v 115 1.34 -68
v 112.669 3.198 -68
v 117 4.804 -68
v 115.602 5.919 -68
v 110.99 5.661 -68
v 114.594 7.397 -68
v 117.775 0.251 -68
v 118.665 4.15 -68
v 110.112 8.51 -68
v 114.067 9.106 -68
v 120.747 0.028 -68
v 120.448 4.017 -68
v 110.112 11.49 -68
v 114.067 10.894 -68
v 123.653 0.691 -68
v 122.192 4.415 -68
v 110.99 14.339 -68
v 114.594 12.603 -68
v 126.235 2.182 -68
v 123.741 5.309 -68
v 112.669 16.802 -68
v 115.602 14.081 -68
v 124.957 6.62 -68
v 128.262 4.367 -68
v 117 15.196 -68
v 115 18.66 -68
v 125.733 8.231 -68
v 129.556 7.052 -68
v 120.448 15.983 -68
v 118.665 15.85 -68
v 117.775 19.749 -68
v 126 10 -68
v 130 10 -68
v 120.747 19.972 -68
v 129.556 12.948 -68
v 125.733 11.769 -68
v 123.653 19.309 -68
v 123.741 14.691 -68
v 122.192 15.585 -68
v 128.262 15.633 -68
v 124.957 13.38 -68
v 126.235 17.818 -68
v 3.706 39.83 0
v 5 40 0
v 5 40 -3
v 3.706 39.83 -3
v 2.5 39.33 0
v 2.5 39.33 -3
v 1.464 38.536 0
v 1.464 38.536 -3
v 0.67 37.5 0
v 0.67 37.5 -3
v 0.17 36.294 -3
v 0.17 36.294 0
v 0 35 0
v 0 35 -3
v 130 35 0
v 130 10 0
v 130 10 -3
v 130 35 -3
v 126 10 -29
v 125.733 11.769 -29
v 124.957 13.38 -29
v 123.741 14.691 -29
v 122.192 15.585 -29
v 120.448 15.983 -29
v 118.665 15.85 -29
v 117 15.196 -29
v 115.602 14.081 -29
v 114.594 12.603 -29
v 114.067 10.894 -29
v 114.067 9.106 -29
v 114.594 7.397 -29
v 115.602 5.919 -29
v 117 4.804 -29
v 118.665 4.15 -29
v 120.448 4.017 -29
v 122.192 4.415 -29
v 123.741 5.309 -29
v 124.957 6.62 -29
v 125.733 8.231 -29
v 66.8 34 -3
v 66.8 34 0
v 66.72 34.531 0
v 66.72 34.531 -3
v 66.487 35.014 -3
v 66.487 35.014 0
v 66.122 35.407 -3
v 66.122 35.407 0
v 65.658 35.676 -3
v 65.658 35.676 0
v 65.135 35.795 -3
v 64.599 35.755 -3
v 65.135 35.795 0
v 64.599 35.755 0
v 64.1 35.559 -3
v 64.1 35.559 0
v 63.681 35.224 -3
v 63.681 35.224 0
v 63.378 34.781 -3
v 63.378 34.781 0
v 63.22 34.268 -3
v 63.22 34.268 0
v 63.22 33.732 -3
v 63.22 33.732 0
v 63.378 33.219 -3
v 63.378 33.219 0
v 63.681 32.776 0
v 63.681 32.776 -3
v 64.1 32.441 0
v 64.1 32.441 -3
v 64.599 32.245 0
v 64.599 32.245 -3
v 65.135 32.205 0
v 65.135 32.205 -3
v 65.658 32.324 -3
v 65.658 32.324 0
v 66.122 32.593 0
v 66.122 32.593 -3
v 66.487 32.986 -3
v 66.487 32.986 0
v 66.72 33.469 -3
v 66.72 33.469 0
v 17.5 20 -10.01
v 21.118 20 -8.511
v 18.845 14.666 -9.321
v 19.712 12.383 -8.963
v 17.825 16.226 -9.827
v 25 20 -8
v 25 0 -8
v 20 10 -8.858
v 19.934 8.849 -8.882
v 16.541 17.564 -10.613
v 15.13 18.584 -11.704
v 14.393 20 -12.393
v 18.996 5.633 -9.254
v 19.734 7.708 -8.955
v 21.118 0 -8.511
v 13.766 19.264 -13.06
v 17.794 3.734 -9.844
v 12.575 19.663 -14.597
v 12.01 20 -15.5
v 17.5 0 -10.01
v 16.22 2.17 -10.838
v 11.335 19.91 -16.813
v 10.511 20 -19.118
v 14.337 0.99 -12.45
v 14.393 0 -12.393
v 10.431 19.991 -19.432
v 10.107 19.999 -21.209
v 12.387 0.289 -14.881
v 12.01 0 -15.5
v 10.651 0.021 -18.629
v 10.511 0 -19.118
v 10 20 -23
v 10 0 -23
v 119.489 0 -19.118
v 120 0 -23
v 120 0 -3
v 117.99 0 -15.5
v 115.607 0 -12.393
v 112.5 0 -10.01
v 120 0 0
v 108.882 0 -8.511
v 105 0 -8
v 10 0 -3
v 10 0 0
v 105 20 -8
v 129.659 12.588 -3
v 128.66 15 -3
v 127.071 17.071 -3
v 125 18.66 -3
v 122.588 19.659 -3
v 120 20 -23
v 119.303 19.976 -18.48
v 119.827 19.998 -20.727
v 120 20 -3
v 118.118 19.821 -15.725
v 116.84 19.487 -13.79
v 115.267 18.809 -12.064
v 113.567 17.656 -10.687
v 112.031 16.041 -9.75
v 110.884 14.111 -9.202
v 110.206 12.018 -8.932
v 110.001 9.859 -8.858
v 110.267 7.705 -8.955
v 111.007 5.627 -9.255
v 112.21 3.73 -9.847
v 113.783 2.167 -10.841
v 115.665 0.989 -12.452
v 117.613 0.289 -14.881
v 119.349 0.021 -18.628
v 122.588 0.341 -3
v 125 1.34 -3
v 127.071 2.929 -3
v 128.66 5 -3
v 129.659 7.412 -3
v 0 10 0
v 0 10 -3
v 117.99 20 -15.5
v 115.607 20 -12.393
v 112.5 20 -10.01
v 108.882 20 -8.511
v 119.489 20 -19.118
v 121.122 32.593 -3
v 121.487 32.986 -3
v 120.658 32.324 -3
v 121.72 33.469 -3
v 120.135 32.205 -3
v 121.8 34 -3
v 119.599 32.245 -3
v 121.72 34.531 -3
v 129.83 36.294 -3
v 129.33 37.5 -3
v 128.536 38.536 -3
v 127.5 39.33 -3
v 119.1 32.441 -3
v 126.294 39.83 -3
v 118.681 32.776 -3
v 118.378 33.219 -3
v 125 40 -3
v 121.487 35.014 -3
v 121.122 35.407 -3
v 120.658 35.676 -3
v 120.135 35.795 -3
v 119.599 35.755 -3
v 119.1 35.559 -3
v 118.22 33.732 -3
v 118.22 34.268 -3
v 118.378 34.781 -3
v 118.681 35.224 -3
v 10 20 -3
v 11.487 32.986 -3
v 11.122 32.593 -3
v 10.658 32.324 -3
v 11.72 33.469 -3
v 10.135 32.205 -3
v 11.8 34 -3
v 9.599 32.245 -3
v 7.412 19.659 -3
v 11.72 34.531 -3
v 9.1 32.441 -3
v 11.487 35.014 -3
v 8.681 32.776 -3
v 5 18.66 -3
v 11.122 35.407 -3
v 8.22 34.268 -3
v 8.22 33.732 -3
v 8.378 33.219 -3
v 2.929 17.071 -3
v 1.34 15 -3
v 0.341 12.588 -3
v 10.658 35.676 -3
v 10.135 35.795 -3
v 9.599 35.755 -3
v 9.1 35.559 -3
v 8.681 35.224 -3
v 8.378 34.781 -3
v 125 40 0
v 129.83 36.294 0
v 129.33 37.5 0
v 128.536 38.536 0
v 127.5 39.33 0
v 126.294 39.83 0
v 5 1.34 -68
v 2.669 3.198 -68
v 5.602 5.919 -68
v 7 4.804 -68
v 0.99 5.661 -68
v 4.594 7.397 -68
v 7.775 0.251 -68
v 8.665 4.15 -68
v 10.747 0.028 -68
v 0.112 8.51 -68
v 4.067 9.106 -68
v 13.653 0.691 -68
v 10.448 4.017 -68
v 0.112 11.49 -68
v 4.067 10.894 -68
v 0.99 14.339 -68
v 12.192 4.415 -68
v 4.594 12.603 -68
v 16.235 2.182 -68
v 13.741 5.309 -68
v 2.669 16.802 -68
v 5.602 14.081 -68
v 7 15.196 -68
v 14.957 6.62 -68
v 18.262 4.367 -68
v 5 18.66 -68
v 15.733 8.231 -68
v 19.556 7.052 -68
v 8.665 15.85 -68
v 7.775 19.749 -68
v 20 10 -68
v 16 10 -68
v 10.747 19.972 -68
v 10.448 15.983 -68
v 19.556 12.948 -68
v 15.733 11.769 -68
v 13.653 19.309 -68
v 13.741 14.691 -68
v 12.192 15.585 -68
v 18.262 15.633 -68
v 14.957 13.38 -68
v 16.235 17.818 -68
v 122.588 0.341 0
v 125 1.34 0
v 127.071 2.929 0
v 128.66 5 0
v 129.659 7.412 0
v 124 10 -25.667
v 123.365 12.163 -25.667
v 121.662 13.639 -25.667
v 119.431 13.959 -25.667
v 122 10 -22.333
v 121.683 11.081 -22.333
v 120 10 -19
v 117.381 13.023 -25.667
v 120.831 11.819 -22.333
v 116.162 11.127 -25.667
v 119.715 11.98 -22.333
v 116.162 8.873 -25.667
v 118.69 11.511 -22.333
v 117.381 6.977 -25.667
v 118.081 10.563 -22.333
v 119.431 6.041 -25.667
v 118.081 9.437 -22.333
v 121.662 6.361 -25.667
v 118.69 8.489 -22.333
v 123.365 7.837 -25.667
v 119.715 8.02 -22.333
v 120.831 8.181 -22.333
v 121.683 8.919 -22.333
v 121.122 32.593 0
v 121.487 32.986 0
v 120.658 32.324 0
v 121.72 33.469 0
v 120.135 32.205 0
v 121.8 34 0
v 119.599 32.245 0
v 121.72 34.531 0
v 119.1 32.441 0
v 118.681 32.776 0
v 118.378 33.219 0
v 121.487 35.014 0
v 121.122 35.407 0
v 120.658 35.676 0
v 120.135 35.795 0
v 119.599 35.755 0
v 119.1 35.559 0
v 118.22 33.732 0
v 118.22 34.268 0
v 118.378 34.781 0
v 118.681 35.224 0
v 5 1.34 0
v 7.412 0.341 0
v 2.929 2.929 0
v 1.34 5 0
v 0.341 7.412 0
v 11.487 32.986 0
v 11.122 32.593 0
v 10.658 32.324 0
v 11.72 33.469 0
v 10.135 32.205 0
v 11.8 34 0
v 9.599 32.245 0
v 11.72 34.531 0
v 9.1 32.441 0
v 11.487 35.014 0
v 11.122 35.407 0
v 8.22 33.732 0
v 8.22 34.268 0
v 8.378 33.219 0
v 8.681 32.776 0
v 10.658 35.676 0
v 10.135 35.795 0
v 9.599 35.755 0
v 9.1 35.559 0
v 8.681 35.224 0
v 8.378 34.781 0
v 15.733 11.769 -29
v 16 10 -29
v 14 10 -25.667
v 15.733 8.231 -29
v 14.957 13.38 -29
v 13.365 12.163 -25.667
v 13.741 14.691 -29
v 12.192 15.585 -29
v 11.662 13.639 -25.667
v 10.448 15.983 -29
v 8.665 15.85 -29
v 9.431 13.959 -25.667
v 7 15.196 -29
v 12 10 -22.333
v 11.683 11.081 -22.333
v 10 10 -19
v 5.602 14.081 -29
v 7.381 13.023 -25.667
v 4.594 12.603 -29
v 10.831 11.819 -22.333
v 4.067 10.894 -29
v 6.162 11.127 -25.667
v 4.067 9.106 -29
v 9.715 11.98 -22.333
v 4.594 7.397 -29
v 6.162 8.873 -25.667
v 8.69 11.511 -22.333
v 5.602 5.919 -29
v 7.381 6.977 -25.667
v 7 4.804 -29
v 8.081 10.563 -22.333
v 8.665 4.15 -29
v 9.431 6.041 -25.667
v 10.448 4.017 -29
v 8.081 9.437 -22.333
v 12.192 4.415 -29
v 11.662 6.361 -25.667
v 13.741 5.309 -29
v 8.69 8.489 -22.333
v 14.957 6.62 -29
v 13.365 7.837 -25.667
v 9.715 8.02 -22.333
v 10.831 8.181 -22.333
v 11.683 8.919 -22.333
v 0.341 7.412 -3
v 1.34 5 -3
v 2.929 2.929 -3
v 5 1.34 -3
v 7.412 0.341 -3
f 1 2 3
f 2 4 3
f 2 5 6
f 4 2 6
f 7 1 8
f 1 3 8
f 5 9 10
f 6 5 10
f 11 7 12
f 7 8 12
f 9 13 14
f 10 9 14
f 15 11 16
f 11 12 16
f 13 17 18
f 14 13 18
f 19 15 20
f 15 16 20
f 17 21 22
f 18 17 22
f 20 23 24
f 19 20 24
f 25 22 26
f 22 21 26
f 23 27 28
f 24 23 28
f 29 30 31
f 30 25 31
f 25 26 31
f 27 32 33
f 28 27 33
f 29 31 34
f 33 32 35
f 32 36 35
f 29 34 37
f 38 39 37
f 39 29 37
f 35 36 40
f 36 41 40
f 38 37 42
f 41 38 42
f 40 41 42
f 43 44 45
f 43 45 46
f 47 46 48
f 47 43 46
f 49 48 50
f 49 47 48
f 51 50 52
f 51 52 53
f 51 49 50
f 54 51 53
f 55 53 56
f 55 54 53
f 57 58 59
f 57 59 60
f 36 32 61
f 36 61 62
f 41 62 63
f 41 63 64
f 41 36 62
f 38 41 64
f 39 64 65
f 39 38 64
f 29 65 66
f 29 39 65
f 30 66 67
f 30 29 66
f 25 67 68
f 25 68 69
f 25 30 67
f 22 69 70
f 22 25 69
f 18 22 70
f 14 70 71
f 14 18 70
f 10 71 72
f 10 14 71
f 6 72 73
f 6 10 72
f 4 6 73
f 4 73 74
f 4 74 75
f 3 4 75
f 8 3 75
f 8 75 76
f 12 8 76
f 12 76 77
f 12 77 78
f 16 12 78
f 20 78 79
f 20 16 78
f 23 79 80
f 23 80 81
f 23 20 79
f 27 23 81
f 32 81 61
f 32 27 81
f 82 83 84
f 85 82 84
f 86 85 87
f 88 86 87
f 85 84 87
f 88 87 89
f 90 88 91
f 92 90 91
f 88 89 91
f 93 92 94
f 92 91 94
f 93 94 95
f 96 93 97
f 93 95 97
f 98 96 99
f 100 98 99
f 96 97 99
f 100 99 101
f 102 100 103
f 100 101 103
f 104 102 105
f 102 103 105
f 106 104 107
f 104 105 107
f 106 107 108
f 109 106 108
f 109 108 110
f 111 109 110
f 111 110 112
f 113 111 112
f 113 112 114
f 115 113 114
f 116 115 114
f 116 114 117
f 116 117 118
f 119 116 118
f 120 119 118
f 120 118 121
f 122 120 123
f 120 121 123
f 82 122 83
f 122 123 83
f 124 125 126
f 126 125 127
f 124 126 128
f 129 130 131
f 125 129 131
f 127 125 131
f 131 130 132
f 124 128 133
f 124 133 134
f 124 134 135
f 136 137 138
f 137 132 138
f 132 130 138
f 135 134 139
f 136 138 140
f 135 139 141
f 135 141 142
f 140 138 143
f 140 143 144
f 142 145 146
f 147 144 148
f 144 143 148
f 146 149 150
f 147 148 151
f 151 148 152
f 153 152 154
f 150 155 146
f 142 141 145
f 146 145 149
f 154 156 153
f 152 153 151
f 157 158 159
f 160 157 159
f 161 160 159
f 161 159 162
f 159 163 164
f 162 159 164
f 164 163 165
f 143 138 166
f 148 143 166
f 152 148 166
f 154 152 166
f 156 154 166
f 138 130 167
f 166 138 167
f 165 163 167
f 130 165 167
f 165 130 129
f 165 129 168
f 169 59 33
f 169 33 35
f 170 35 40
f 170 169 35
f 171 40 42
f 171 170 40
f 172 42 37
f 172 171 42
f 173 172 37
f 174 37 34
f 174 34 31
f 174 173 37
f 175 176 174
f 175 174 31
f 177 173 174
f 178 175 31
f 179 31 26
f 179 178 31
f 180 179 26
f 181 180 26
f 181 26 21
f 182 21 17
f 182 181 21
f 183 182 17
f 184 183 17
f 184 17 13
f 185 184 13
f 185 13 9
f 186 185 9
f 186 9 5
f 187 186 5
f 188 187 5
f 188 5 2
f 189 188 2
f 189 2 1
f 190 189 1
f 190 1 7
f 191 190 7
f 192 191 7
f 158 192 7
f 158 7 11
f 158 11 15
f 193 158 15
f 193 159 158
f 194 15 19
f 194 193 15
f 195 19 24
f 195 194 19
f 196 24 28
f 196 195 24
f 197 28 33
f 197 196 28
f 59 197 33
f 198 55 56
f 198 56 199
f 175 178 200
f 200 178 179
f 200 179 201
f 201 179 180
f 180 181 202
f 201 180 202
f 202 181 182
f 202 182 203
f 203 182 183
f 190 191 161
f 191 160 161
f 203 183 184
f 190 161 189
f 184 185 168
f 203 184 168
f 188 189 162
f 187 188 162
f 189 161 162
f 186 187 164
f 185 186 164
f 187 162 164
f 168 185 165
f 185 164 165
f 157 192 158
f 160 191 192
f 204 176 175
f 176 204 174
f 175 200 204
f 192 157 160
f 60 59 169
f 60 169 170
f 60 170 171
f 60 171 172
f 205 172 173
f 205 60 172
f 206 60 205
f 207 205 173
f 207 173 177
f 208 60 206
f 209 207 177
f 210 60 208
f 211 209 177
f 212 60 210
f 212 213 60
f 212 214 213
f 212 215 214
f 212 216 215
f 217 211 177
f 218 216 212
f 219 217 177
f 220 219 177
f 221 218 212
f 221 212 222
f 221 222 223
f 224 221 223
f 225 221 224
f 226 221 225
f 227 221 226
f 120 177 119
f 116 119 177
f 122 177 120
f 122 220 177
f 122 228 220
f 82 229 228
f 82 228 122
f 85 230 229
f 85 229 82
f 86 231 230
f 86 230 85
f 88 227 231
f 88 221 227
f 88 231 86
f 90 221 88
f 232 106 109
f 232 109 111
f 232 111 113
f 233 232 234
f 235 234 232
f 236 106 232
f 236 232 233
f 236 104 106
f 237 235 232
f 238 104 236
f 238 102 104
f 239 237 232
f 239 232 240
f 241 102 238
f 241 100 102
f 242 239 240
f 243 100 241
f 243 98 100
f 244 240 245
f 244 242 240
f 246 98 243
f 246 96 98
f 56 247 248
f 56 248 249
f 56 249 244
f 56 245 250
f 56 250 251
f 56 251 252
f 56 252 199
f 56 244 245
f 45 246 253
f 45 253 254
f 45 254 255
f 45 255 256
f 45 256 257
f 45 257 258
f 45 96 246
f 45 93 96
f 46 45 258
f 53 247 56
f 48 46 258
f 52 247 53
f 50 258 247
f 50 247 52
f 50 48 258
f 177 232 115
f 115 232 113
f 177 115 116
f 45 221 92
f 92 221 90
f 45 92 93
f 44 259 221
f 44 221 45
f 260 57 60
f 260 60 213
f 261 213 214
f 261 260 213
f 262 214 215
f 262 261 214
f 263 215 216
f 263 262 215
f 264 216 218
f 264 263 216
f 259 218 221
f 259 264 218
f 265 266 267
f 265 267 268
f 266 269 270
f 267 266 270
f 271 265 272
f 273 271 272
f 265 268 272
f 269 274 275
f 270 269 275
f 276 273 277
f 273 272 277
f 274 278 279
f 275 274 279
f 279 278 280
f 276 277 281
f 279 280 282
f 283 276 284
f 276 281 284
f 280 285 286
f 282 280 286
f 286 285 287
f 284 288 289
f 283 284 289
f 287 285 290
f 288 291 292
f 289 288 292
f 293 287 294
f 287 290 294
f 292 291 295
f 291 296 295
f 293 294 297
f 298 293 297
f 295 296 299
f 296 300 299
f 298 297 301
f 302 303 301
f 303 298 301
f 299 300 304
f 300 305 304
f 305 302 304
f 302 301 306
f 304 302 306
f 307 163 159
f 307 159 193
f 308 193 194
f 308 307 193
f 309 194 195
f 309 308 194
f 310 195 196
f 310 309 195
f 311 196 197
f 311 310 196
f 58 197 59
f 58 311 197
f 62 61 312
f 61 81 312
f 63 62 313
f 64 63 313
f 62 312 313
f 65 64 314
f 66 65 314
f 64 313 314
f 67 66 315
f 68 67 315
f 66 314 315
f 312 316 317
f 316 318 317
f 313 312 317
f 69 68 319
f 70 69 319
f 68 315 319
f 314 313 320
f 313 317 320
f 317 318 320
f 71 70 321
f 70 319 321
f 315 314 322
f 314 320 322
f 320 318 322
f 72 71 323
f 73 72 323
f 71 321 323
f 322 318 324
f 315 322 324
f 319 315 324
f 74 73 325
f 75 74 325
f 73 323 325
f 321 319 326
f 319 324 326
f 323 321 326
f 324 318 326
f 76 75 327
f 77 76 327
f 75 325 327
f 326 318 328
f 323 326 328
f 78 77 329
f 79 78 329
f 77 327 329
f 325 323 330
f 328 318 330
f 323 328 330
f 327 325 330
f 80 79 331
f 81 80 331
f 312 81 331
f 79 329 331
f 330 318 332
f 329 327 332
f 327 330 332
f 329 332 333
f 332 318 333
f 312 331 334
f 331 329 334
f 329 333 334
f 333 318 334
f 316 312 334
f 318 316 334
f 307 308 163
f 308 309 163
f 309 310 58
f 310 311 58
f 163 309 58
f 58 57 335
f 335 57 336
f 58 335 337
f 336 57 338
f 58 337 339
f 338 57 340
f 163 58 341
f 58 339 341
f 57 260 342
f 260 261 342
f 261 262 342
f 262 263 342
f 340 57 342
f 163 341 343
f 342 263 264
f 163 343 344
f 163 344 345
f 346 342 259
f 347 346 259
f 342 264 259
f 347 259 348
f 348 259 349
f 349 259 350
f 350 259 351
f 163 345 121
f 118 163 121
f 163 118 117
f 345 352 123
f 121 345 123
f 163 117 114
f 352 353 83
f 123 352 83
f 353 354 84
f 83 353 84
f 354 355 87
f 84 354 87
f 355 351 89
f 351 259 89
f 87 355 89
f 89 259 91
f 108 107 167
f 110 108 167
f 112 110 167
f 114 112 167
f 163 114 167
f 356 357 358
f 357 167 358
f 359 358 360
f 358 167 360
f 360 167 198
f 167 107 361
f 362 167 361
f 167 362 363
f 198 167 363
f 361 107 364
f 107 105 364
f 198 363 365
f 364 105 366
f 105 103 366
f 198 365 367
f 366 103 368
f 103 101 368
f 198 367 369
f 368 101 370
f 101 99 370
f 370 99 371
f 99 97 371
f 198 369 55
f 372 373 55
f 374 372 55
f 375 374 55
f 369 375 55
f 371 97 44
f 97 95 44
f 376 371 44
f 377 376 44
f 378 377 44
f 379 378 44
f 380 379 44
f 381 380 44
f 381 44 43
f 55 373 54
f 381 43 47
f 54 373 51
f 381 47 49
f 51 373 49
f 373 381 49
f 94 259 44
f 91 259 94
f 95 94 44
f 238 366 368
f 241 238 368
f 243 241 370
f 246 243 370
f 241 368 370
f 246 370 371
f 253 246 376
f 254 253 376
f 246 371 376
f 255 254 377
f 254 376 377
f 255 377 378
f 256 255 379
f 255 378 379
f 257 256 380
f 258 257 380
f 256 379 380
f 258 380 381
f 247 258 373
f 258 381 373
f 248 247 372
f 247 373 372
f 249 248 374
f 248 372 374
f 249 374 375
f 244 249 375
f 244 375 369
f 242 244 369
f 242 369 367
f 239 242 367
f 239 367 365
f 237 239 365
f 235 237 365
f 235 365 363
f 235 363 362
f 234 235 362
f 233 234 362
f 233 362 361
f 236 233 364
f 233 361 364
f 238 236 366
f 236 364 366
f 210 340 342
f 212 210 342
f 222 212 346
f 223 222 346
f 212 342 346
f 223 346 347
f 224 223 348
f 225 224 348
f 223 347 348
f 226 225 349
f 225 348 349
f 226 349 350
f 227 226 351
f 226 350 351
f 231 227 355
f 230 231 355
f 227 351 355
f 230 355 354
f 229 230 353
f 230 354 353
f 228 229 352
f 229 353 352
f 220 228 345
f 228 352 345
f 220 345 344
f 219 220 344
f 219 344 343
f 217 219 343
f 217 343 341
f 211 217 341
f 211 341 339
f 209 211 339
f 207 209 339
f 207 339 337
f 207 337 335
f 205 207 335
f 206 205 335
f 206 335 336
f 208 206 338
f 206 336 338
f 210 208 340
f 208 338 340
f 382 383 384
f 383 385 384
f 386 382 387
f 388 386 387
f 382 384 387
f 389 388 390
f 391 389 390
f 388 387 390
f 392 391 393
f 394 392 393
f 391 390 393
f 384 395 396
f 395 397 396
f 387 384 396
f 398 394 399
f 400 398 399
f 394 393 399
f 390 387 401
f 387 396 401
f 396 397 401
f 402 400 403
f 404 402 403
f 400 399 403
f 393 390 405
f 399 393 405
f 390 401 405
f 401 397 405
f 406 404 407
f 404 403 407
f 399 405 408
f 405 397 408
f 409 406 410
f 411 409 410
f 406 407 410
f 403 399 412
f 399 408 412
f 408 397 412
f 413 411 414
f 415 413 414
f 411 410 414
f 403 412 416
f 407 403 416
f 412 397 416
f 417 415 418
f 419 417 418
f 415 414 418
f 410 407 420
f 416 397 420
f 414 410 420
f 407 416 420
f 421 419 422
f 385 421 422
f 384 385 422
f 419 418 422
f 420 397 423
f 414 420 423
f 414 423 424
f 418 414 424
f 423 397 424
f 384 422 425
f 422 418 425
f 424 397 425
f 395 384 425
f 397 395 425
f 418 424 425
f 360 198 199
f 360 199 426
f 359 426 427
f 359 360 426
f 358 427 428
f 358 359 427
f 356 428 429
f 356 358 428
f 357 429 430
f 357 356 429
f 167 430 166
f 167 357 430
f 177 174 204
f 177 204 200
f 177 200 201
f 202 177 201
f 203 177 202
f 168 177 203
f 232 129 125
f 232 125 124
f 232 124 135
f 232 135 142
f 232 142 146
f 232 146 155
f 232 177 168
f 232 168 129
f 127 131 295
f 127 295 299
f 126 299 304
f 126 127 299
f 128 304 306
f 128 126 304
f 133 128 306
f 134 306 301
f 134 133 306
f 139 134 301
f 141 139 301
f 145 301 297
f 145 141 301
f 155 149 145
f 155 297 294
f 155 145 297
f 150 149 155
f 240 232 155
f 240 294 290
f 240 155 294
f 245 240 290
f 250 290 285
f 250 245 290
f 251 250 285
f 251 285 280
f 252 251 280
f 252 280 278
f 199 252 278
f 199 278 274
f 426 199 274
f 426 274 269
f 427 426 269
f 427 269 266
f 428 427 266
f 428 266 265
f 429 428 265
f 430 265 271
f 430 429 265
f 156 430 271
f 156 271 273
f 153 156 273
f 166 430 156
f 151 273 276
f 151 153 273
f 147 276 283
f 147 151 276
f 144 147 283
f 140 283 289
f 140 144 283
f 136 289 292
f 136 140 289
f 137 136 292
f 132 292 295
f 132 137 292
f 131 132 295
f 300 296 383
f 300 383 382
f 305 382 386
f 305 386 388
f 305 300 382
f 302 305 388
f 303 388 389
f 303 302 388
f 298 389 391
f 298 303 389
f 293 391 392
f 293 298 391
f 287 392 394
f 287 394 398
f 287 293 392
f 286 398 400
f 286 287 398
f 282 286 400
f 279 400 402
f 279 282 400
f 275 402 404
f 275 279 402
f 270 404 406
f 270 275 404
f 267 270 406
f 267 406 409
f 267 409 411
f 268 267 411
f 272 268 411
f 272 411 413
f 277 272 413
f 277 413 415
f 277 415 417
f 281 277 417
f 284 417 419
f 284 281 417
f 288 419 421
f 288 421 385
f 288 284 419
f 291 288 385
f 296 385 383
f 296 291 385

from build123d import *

# Parameters (mm, degrees)
SKETCH002_R  = 1.8
PAD002_DEPTH = 3
SKETCH003_R  = 10
PAD003_DEPTH = 65
PAD004_DEPTH = 20
SKETCH008_R  = 6
POCKET_DEPTH = 39


with BuildPart() as part:
    # Sketch002 → Pad002 (new body)
    with BuildSketch(Plane.XY):
        with BuildLine():
            Line((120, 0), (10, 0))
            ThreePointArc((0, 10), (2.928932, 2.928932), (10, 0))
            Line((0, 35), (0, 10))
            ThreePointArc((5, 40), (1.464466, 38.535534), (0, 35))
            Line((125, 40), (5, 40))
            ThreePointArc((130, 35), (128.535534, 38.535534), (125, 40))
            Line((130, 10), (130, 35))
            ThreePointArc((120, 0), (127.071068, 2.928932), (130, 10))
        make_face()
        with Locations((120, 34)):
            Circle(SKETCH002_R, mode=Mode.SUBTRACT)
        with Locations((10, 34)):
            Circle(SKETCH002_R, mode=Mode.SUBTRACT)
        with Locations((65, 34)):
            Circle(SKETCH002_R, mode=Mode.SUBTRACT)
    extrude(amount=-PAD002_DEPTH)

    # Sketch003 → Pad003 (join)
    with BuildSketch(Plane.XY.offset(-3)):
        with Locations((10, 10)):
            Circle(SKETCH003_R)
        with Locations((120, 10)):
            Circle(SKETCH003_R)
    extrude(amount=-PAD003_DEPTH)

    # Sketch004 → Pad004 (join)
    with BuildSketch(Plane.XZ):
        with BuildLine():
            Line((10, -3), (120, -3))
            Line((120, -3), (120, -23))
            ThreePointArc((120, -23), (115.606602, -12.393398), (105, -8))
            Line((25, -8), (105, -8))
            ThreePointArc((25, -8), (14.393398, -12.393398), (10, -23))
            Line((10, -23), (10, -3))
        make_face()
    extrude(amount=-PAD004_DEPTH)

    # Sketch008 → Pocket (cut)
    with BuildSketch(Plane.XY.offset(-68)):
        with Locations((10, 10)):
            Circle(SKETCH008_R)
        with Locations((120, 10)):
            Circle(SKETCH008_R)
    extrude(amount=POCKET_DEPTH, mode=Mode.SUBTRACT)

    # Cone001 → Cone001 (revolve, cut)
    with BuildSketch(Plane(origin=(10, 10, -29), x_dir=(1, 0, 0), z_dir=(0, -1, 0))):
        Polygon((0, 0), (6, 0), (0, 10), align=None)
    revolve(axis=Axis((10, 10, -29), (0, 0, 1)), mode=Mode.SUBTRACT)

    # Cone002 → Cone002 (revolve, cut)
    with BuildSketch(Plane(origin=(120, 10, -29), x_dir=(1, 0, 0), z_dir=(0, -1, 0))):
        Polygon((0, 0), (6, 0), (0, 10), align=None)
    revolve(axis=Axis((120, 10, -29), (0, 0, 1)), mode=Mode.SUBTRACT)


solid = part.part
